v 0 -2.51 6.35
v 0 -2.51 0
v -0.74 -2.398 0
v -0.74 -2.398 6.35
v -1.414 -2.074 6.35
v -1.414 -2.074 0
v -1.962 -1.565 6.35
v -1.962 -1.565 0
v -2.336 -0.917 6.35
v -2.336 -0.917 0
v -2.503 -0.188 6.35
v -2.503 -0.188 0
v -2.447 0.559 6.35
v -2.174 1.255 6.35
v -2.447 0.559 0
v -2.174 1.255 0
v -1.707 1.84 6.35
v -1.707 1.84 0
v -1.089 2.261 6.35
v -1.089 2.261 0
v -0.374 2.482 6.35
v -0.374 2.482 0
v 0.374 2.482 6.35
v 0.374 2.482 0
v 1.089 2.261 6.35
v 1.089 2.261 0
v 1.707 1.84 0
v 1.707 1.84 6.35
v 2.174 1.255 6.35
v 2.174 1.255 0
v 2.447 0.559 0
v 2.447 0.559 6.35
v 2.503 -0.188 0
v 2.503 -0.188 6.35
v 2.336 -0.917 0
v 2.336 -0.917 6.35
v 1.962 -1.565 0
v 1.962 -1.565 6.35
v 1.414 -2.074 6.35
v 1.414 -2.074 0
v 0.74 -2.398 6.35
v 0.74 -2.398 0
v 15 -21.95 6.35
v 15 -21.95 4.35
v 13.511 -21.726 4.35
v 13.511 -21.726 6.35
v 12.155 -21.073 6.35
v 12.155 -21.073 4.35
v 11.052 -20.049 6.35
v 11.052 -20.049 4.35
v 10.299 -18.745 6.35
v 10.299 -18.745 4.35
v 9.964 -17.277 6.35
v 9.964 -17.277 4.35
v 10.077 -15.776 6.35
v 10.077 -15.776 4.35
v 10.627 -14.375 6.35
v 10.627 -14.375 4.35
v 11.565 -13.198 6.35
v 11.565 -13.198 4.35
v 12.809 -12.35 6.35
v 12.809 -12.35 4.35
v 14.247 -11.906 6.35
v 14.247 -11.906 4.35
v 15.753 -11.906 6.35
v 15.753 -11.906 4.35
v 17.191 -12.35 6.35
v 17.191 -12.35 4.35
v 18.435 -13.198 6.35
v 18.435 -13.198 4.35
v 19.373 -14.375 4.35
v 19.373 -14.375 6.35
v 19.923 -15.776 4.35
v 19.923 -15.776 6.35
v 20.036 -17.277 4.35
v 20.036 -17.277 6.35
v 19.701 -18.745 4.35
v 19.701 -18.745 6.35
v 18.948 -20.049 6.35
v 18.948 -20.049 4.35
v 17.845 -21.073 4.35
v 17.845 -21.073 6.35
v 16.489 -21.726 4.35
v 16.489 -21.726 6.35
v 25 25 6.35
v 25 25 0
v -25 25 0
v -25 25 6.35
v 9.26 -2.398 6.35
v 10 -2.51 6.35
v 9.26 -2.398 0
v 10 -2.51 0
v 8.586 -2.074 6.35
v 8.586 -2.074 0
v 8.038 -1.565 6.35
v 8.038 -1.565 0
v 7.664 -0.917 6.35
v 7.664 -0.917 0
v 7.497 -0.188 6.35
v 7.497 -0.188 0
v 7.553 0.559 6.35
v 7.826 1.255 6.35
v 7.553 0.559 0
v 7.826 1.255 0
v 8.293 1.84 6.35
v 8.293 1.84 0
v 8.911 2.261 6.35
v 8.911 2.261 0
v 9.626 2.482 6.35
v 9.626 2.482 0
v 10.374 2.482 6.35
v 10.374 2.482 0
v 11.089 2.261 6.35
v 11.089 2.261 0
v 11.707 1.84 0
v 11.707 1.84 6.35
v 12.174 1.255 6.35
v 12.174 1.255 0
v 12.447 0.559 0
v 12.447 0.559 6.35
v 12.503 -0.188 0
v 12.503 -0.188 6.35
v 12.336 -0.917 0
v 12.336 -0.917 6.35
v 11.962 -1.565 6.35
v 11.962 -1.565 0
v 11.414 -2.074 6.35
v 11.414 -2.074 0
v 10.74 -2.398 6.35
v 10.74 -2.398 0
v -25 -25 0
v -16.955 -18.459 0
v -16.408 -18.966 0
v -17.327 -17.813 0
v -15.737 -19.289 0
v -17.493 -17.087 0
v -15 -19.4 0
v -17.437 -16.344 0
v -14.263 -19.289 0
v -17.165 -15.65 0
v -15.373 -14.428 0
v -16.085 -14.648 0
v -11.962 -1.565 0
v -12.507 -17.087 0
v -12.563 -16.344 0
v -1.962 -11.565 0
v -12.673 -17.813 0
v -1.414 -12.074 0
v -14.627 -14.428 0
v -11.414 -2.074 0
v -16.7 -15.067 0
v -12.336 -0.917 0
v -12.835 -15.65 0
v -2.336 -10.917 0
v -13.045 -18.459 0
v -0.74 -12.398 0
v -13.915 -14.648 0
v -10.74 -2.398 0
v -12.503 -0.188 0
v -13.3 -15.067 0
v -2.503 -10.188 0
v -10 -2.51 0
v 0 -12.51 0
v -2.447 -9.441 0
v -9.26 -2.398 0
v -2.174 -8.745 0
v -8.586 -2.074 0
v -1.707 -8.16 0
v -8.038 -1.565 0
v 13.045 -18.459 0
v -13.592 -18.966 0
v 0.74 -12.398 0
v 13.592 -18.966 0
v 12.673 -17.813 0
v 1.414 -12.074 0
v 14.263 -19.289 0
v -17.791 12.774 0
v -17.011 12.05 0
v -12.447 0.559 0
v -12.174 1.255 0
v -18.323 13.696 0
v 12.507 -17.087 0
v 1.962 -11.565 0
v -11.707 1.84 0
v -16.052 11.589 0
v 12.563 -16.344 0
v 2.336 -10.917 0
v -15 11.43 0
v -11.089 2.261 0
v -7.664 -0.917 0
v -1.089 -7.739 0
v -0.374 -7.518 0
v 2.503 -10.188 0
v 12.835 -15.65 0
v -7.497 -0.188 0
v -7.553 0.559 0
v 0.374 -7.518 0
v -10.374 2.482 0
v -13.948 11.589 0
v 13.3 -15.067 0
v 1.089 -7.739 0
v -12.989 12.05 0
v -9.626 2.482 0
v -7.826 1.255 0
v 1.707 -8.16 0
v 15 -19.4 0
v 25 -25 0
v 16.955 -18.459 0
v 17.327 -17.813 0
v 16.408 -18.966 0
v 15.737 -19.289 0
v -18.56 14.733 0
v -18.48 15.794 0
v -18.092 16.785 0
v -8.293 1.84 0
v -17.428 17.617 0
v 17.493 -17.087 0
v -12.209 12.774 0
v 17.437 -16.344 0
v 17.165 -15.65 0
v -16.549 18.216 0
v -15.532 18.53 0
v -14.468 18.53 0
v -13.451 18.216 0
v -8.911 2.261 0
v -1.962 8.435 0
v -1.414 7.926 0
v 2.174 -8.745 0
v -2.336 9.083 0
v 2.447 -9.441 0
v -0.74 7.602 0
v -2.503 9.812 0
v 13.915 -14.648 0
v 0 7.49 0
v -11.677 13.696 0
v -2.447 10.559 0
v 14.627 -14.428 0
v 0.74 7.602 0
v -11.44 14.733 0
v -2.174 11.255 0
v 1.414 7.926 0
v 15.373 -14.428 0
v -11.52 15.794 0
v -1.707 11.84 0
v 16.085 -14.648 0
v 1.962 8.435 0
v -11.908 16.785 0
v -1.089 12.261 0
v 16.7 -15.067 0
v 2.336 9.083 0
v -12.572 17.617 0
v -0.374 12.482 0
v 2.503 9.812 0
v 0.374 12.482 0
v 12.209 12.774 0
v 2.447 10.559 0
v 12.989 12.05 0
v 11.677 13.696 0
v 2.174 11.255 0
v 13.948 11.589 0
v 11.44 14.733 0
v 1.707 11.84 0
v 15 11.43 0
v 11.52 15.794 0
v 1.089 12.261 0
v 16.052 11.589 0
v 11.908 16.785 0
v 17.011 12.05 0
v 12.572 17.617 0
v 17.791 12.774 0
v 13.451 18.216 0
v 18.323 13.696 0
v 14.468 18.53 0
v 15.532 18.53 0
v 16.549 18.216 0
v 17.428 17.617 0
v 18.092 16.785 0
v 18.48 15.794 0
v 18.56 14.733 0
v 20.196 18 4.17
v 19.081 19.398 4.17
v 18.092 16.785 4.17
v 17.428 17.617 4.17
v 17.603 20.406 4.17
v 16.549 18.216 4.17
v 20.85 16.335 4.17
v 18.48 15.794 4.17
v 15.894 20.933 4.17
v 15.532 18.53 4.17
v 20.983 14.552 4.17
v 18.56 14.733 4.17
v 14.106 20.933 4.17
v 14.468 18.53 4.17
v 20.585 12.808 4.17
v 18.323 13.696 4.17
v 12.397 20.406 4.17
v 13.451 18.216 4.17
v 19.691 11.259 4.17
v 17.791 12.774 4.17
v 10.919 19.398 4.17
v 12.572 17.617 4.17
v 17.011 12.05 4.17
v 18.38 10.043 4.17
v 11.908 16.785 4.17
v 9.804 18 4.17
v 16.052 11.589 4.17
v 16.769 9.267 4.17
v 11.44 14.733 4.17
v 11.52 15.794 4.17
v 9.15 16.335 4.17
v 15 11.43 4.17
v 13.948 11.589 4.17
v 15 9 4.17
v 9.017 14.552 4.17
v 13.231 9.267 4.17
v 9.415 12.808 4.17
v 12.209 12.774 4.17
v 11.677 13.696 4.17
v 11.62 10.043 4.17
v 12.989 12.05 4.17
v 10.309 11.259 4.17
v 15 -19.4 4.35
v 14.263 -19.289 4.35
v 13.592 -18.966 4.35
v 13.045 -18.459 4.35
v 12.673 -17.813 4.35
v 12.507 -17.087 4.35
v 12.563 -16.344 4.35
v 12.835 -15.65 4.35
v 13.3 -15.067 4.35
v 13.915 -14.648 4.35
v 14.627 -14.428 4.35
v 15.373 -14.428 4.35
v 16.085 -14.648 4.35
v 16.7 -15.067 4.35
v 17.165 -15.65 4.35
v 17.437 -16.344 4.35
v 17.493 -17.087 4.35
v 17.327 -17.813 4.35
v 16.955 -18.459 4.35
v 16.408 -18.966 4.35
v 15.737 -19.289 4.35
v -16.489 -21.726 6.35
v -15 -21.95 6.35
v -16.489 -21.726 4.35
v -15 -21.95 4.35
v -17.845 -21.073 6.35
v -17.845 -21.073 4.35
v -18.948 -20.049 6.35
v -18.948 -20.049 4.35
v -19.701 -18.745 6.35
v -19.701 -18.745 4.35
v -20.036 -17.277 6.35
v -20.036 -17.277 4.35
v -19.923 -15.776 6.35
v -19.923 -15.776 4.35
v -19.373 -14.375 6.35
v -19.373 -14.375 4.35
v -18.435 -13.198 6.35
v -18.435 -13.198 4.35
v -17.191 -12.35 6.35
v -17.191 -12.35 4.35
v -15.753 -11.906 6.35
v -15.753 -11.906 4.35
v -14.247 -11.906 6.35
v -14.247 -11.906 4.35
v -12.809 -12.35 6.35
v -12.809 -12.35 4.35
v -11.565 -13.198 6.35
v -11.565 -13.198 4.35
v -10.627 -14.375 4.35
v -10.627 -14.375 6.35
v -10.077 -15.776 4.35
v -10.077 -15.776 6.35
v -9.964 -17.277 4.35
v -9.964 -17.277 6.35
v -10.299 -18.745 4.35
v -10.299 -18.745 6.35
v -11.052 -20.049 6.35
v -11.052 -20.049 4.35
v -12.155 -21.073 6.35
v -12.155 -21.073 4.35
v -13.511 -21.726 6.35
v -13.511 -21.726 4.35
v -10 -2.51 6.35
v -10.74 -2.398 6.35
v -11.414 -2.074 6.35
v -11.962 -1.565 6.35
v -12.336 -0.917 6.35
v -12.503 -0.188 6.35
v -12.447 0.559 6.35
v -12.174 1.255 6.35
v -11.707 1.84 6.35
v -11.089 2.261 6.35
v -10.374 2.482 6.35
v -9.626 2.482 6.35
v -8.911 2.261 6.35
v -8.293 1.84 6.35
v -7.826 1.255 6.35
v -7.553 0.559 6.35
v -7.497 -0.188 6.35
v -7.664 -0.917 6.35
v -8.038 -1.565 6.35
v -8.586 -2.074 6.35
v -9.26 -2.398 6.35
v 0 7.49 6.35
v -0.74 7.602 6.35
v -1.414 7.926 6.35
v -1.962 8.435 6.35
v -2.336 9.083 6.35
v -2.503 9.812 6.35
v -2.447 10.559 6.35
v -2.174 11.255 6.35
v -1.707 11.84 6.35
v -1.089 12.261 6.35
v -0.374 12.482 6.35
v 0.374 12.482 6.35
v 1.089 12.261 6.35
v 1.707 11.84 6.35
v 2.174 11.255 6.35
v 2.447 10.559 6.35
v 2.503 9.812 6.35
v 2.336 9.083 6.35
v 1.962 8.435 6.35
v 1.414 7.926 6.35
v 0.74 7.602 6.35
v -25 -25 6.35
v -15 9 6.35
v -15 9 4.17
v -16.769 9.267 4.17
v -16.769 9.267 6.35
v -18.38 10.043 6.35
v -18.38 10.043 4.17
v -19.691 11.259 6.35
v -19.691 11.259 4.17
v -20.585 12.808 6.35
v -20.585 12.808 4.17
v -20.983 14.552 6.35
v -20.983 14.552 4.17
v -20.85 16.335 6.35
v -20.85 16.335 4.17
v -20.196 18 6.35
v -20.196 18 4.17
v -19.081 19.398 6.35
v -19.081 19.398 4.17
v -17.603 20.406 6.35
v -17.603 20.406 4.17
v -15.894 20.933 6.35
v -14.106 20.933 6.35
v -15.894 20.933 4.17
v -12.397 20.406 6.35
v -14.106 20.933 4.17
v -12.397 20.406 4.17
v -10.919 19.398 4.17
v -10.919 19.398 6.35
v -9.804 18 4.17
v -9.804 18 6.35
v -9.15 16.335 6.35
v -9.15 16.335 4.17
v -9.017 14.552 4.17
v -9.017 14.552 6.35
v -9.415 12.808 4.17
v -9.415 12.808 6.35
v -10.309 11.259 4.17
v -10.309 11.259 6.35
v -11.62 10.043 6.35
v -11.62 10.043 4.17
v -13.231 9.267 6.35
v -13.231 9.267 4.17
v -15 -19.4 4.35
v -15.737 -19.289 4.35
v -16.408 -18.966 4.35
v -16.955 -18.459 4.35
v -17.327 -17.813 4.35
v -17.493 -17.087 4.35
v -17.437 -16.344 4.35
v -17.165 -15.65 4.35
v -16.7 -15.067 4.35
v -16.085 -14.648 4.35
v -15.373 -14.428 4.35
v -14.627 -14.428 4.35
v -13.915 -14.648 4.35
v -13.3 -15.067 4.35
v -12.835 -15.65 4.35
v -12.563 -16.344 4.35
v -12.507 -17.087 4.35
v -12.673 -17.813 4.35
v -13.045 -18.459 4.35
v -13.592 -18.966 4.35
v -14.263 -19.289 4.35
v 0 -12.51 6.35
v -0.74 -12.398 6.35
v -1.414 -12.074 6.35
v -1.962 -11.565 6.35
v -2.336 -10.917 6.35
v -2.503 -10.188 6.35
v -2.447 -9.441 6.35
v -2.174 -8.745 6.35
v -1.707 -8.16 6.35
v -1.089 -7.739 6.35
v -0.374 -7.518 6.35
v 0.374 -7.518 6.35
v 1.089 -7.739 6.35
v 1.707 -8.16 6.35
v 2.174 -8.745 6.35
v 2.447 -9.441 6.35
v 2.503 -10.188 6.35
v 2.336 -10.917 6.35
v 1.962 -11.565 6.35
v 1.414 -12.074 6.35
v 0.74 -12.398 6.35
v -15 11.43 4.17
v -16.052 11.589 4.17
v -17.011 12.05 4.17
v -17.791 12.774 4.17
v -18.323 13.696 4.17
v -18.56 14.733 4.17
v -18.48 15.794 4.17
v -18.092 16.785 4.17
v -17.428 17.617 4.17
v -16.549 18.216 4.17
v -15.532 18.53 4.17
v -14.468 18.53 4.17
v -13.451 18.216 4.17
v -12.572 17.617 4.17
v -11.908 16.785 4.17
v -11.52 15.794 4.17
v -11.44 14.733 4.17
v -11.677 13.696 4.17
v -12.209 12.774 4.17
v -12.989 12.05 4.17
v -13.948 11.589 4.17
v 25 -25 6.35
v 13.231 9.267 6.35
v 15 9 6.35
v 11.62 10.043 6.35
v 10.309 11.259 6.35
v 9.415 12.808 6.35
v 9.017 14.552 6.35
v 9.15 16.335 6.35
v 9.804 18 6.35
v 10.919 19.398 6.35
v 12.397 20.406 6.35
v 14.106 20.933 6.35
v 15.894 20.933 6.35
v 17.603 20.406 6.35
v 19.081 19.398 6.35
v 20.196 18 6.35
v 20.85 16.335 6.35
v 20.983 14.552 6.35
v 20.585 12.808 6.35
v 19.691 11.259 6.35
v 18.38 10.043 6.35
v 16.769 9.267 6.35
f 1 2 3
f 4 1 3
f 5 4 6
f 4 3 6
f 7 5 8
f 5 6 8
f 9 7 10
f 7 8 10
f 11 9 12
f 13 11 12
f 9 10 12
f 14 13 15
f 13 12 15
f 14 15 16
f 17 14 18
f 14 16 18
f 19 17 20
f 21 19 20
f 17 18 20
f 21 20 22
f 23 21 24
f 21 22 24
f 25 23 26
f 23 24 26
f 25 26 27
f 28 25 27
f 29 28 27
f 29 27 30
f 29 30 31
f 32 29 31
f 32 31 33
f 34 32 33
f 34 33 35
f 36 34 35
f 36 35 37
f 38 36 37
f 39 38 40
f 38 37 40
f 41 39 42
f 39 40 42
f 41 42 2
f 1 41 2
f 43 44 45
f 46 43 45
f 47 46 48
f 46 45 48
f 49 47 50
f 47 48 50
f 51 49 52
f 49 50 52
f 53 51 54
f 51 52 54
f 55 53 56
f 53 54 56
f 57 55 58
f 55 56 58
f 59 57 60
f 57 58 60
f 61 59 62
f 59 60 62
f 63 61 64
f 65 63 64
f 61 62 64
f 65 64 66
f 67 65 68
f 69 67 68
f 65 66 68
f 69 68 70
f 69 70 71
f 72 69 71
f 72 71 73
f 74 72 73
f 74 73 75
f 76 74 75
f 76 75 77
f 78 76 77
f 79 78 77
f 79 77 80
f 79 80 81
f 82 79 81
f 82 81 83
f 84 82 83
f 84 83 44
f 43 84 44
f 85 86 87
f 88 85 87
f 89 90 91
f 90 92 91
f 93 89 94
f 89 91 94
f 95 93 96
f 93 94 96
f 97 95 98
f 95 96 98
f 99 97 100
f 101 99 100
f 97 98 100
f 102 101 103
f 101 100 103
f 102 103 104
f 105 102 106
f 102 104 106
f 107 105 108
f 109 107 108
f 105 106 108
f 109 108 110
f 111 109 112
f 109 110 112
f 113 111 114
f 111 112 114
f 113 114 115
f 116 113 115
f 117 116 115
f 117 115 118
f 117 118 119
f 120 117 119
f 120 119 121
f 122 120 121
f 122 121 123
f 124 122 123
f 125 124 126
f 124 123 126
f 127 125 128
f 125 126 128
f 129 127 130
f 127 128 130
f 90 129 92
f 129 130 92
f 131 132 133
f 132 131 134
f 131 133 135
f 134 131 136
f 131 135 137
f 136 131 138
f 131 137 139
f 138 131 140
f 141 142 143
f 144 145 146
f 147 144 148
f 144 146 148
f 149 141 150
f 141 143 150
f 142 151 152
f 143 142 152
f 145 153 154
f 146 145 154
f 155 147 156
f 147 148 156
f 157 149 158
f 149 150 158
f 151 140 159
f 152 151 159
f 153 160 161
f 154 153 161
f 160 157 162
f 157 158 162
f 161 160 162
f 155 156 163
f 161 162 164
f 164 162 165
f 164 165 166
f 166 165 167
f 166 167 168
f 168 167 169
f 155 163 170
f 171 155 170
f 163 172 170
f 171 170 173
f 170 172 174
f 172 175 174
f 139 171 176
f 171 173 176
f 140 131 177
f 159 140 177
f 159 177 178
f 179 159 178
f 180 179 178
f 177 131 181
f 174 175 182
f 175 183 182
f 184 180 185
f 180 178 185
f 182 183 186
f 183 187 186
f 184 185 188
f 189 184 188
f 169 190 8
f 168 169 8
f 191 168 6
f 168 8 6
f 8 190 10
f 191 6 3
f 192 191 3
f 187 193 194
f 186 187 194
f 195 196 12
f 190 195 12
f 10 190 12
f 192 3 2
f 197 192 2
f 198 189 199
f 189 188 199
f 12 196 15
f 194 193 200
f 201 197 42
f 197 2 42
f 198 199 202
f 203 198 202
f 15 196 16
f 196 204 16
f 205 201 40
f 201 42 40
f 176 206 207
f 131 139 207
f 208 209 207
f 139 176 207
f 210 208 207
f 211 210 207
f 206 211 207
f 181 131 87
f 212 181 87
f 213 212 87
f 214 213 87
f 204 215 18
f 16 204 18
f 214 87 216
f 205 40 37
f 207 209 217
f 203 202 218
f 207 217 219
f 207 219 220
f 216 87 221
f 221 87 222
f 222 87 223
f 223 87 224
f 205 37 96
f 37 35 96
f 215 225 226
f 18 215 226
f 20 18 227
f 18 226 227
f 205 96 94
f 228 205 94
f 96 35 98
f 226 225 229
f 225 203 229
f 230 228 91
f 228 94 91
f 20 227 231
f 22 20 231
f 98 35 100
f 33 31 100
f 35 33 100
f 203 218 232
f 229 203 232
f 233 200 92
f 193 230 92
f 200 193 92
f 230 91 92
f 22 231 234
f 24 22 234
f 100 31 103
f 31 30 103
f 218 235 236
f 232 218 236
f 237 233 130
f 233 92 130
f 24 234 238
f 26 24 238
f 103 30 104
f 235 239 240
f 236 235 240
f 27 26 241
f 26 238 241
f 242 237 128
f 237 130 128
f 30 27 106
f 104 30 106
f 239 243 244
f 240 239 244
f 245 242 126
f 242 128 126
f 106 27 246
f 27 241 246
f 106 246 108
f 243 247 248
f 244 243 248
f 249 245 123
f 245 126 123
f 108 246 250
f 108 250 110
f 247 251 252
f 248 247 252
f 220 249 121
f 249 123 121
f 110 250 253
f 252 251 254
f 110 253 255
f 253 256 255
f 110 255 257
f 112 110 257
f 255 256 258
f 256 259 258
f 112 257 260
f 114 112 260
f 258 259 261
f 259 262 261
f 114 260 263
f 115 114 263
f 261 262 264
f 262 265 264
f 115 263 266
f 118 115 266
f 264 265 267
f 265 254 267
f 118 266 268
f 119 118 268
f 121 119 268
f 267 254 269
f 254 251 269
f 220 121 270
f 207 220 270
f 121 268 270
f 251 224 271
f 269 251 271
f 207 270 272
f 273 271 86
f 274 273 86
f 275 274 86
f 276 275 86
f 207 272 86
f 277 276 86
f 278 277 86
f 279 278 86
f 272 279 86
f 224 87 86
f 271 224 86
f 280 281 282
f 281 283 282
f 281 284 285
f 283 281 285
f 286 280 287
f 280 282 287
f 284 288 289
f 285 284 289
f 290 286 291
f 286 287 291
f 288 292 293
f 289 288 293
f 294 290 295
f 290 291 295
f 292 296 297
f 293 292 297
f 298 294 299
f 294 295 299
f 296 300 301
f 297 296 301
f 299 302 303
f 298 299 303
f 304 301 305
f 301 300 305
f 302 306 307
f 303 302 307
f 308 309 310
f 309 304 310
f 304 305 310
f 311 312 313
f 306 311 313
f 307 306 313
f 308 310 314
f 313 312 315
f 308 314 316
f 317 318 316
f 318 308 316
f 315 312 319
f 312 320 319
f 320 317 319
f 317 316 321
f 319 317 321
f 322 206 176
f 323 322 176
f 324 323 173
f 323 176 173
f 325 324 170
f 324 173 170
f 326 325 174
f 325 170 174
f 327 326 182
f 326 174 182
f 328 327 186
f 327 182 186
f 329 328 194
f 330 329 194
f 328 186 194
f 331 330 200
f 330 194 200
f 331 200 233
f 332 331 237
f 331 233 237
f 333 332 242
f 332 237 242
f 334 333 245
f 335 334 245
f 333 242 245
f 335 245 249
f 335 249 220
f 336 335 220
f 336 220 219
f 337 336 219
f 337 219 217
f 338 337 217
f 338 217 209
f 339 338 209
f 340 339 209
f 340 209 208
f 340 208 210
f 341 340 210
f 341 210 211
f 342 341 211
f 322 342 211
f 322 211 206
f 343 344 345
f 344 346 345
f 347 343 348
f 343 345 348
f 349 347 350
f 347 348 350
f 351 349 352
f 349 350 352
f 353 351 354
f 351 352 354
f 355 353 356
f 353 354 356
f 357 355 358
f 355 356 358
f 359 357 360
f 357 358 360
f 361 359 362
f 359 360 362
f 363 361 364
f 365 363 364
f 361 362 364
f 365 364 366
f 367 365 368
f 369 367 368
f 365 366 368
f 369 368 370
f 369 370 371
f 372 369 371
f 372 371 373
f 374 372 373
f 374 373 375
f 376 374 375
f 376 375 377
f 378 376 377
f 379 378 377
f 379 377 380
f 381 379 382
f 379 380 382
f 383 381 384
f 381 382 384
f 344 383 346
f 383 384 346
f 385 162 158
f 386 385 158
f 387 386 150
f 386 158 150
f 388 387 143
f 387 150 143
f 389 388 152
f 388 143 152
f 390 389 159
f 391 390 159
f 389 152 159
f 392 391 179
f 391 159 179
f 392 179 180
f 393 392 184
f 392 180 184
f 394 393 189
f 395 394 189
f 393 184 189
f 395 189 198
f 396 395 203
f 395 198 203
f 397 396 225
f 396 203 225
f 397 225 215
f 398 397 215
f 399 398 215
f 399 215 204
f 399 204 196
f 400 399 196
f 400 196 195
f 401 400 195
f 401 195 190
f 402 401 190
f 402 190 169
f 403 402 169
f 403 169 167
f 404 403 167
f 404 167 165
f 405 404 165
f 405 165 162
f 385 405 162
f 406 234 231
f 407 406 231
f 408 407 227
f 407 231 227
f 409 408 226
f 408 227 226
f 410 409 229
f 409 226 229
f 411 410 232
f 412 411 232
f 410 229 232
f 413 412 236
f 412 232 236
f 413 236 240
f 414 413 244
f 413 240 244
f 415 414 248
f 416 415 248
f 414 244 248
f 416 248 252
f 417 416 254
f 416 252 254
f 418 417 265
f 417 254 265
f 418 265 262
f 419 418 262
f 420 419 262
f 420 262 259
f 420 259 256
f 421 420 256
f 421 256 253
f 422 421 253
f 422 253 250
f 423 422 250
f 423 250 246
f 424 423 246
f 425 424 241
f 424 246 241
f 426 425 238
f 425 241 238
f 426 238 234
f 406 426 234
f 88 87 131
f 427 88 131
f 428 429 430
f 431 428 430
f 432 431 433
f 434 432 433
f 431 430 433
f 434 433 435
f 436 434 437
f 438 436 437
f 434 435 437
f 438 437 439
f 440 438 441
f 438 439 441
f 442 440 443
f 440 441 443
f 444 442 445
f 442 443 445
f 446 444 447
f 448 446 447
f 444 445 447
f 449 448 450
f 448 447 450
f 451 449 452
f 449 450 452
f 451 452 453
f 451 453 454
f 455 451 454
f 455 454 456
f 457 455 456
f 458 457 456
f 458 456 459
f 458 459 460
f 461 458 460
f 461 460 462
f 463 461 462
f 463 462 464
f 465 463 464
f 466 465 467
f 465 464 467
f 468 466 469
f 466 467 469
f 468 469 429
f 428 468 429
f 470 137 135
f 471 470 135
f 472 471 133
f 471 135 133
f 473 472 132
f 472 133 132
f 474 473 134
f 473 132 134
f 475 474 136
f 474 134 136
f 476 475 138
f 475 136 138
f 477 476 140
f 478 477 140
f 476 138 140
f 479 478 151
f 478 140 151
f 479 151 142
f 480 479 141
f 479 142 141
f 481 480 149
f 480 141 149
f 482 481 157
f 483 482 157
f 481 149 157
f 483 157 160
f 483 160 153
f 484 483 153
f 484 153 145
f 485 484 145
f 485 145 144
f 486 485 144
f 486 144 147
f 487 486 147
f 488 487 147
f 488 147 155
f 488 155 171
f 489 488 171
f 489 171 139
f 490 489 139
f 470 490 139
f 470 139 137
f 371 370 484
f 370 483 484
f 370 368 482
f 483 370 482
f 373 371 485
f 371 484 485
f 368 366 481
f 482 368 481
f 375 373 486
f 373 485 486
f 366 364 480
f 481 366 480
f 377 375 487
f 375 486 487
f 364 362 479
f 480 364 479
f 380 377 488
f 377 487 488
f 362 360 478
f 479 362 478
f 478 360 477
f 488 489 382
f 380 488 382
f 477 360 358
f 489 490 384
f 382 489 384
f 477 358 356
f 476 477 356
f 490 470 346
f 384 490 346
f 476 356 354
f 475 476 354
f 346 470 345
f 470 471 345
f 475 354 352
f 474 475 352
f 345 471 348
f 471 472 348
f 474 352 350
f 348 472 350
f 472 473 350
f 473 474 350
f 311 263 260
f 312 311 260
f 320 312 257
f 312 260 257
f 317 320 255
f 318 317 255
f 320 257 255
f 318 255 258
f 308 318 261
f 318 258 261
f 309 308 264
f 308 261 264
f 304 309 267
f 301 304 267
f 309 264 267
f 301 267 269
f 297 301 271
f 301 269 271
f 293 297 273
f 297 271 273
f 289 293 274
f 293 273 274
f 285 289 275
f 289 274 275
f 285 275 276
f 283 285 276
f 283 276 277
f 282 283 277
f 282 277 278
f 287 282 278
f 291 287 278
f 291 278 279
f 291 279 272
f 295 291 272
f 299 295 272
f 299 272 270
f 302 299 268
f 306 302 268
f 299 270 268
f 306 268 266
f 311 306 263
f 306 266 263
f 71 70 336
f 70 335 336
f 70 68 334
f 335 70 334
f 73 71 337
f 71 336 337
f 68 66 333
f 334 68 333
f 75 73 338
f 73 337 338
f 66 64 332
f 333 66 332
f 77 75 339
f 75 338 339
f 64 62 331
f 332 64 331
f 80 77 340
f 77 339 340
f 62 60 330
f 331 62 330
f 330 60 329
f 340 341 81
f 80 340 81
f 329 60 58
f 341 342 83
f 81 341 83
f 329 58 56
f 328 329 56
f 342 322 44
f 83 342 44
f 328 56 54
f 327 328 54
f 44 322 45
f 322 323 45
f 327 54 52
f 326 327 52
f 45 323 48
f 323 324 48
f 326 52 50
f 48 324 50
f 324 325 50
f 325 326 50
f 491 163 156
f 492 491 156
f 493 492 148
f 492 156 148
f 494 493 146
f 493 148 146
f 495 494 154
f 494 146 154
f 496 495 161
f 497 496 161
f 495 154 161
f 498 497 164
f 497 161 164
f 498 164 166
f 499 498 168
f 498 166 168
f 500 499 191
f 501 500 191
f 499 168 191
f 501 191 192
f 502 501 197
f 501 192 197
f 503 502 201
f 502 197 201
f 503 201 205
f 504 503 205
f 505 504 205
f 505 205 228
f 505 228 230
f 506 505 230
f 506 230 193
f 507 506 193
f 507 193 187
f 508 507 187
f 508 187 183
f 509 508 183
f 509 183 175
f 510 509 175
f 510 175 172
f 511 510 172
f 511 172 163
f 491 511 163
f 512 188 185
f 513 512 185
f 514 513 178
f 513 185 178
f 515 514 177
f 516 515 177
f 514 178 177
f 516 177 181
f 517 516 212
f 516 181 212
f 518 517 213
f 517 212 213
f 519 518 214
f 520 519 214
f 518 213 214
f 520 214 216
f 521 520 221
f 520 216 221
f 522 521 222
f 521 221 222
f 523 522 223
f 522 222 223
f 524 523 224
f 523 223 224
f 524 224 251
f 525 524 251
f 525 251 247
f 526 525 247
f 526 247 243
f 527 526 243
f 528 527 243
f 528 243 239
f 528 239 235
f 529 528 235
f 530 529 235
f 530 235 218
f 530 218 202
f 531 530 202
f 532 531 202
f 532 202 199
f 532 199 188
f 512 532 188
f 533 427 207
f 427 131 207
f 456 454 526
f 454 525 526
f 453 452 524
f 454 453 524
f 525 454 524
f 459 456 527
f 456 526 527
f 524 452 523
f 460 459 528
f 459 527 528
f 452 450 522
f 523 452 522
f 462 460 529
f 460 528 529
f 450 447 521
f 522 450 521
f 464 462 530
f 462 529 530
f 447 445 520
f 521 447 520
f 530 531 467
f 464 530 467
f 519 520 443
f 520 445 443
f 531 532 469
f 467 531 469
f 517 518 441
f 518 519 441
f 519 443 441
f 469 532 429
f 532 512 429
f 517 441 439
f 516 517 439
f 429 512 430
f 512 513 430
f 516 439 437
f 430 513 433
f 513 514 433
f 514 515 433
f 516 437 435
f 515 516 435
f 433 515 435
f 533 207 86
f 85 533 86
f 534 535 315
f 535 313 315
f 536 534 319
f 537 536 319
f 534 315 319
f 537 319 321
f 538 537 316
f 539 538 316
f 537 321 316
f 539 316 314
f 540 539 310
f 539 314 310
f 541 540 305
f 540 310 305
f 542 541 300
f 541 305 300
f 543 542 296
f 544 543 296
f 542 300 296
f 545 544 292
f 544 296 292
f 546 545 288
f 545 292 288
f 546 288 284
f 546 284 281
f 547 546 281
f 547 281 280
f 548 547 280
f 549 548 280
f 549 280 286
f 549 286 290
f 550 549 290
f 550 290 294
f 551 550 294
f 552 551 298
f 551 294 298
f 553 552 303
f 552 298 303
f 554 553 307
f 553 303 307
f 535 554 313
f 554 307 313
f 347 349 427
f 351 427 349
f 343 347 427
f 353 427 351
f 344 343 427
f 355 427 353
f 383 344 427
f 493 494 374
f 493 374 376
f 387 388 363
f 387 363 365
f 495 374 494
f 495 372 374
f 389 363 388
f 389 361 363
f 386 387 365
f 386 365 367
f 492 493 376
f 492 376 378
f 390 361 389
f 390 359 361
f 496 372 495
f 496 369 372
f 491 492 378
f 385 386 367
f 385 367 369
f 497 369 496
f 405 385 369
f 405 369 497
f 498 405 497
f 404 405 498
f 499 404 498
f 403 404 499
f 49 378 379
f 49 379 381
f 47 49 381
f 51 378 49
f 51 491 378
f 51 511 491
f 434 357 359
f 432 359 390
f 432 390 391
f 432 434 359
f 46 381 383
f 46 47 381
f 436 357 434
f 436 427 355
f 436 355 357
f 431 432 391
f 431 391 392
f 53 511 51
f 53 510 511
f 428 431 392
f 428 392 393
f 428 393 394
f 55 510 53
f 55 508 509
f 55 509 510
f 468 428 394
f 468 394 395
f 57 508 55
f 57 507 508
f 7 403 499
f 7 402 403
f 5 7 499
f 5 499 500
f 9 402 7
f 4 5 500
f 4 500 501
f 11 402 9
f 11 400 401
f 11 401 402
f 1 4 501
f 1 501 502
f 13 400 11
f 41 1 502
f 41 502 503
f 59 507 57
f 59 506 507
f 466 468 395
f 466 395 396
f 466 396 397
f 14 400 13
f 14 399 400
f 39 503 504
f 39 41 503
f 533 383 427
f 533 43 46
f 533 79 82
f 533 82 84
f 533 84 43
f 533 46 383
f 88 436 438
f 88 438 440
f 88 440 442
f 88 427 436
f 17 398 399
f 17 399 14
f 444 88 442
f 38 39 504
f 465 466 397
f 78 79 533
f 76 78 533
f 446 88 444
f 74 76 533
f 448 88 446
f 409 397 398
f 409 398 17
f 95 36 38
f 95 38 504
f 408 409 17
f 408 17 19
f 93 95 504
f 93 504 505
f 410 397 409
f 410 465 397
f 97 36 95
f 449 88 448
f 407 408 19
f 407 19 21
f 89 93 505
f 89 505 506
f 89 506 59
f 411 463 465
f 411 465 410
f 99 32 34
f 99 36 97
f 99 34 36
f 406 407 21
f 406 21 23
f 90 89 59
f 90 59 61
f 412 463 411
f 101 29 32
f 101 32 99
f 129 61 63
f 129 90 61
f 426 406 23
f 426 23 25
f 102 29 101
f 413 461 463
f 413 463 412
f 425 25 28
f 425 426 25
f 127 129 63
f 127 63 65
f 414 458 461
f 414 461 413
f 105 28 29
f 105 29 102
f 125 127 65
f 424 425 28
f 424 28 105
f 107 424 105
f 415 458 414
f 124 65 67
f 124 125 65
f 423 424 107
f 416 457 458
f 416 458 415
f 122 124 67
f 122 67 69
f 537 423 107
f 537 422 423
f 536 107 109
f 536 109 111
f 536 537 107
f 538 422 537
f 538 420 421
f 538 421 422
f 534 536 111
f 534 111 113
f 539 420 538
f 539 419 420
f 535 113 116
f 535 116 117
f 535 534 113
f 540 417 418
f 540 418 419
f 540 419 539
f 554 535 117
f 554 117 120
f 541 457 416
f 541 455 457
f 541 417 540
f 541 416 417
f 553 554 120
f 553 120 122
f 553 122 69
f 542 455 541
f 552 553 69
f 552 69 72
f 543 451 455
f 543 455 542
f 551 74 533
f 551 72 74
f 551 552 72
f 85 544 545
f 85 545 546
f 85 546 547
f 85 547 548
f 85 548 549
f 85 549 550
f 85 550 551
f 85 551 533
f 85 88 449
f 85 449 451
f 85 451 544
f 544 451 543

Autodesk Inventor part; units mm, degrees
ref_plane "Work Plane1" through (0, -18.83, 0) normal (-1, 0, 0) x (0, 0, 1)
ref_plane "YZ Plane" through (0, 0, 0) normal (1, 0, 0) x (0, 1, 0)
ref_plane "XZ Plane" through (0, 0, 0) normal (0, 1, 0) x (-1, 0, 0)
sketch "Sketch1" plane through (0, 0, 0) normal (0, 0, 1) x (1, 0, 0)
  line L0 (-25, -25) -> (25, -25)
  line L1 (25, -25) -> (25, 25)
  line L2 (25, 25) -> (-25, 25)
  line L3 (-25, 25) -> (-25, -25)
  line L4 (-25, -25) -> (25, 25) construction
  line L5 (25, -25) -> (-25, 25) construction
  point P0 (0, 0)
  dimension "Width" = 50
  dimension "Height" = 50
extrude "Extrusion1" add sketch "Sketch1" along normal blind 6.35
sketch "Sketch2" plane through (0, 0, 6.35) normal (0, 0, 1) x (1, 0, 0)
  line L0 (-25, -25) -> (25, -25) projected
  line L1 (25, -25) -> (25, 25) projected
  line L2 (25, 25) -> (-25, 25) projected
  line L3 (-25, 25) -> (-25, -25) projected
  line L4 (0, 25) -> (0, -25) construction
  line L5 (-25, 0) -> (25, 0) construction
  point P0 (0, 0)
  point P1 (0, 0)
  point P2 (-10, 0)
  point P3 (0, 10)
  point P4 (0, -10)
  point P5 (10, 0)
  dimension "d4" = 10
  dimension "d5" = 10
  dimension "d6" = 10
  dimension "d7" = 10
hole "Hole1" at (0, 0, 6.35) at (-10, 0, 6.35) at (0, 10, 6.35) at (0, -10, 6.35) at (10, 0, 6.35) direction (0, 0, -1) diameter 5.02 end through all
sketch "Sketch3" plane through (0, 0, 6.35) normal (0, 0, 1) x (1, 0, 0)
  line L0 (-25, -25) -> (25, -25) projected
  line L1 (25, -25) -> (25, 25) projected
  line L2 (25, 25) -> (-25, 25) projected
  line L3 (-25, 25) -> (-25, -25) projected
  line L4 (0, 25) -> (0, -25) construction
  line L5 (25, 0) -> (-25, 0) construction
  line L6 (15, 25) -> (15, -25) construction
  line L7 (-25, -15) -> (25, -15) construction
  point P0 (15, 15)
  point P1 (-15, 15)
  dimension "d15" = 15
  dimension "d16" = 15
hole "Hole2" at (-15, 15, 6.35) at (15, 15, 6.35) direction (0, 0, -1) diameter 7.14 end through all counterbore diameter 12 counterbore depth 2.18
sketch "Sketch6" plane through (0, 0, 6.35) normal (0, 0, 1) x (1, 0, 0)
  circle A0 centre (-15, 15) radius 6 projected
  circle A1 centre (15, 15) radius 6 projected
  circle A2 centre (0, -10) radius 2.51 projected
  circle A3 centre (-10, 0) radius 2.51 projected
  circle A4 centre (0, 0) radius 2.51 projected
  circle A5 centre (0, 10) radius 2.51 projected
  circle A6 centre (10, 0) radius 2.51 projected
  line L0 (-25, -25) -> (25, -25) projected
  line L1 (25, -25) -> (25, 25) projected
  line L2 (25, 25) -> (-25, 25) projected
  line L3 (-25, 25) -> (-25, -25) projected
sketch "Sketch7" plane through (0, 0, 6.35) normal (0, 0, 1) x (1, 0, 0)
  circle A0 centre (-15, 15) radius 6 projected
  circle A1 centre (15, 15) radius 6 projected
  line L0 (-25, -25) -> (25, -25) projected
  line L1 (25, -25) -> (25, 25) projected
  line L2 (-25, 25) -> (-25, -25) projected
  line L3 (15, 15) -> (15, -25) construction
  line L4 (25, -16.9) -> (-25, -16.9) construction
  line L5 (-15, 15) -> (-15, -16.9) construction
  point P0 (15, -16.9)
  dimension "d35" = 31.9
hole "Hole3" at (-15, -16.9, 6.35) at (15, -16.9, 6.35) direction (0, 0, -1) diameter 5 end through all counterbore diameter 10.1 counterbore depth 2
sketch "Sketch4" plane through (0, 0, 6.35) normal (0, 0, 1) x (1, 0, 0)
  line L0 (25, -18.83) -> (25, 18.83) projected
  line L1 (-25, 18.83) -> (-25, -18.83) projected
  line L2 (-25, 0) -> (25, 0) construction
  line L3 (-22.25, 3.35) -> (-19.75, 3.35)
  line L4 (-19.75, 3.35) -> (-19.75, -3.35)
  line L5 (-19.75, -3.35) -> (-22.25, -3.35)
  line L6 (-22.25, -3.35) -> (-22.25, 3.35)
  line L7 (-22.25, 3.35) -> (-19.75, -3.35) construction
  line L8 (-19.75, 3.35) -> (-22.25, -3.35) construction
  point P0 (-21, 0)
  dimension "d25" = 2.5
  dimension "d27" = 5.25
  dimension "d28" = 6.7
sketch "Sketch5" plane through (-25, -18.83, 0) normal (-1, 0, 0) x (0, 0, 1)
  line L0 (6.35, 37.66) -> (6.35, 0) projected
  line L1 (0, 15.48) -> (0, 22.18) projected
  line L2 (6.35, 22.18) -> (0, 22.18) projected
  line L3 (6.35, 15.48) -> (0, 15.48) projected
  line L4 (6.35, 22.18) -> (4.17, 22.18)
  line L5 (4.17, 22.18) -> (4.17, 15.48)
  line L6 (4.17, 15.48) -> (6.35, 15.48)
  line L7 (6.35, 15.48) -> (6.35, 22.18)
  point P0 (0, 18.83)
  dimension "d31" = 2.18
properties part number "Micro V Plate" material "Aluminum 6061"
